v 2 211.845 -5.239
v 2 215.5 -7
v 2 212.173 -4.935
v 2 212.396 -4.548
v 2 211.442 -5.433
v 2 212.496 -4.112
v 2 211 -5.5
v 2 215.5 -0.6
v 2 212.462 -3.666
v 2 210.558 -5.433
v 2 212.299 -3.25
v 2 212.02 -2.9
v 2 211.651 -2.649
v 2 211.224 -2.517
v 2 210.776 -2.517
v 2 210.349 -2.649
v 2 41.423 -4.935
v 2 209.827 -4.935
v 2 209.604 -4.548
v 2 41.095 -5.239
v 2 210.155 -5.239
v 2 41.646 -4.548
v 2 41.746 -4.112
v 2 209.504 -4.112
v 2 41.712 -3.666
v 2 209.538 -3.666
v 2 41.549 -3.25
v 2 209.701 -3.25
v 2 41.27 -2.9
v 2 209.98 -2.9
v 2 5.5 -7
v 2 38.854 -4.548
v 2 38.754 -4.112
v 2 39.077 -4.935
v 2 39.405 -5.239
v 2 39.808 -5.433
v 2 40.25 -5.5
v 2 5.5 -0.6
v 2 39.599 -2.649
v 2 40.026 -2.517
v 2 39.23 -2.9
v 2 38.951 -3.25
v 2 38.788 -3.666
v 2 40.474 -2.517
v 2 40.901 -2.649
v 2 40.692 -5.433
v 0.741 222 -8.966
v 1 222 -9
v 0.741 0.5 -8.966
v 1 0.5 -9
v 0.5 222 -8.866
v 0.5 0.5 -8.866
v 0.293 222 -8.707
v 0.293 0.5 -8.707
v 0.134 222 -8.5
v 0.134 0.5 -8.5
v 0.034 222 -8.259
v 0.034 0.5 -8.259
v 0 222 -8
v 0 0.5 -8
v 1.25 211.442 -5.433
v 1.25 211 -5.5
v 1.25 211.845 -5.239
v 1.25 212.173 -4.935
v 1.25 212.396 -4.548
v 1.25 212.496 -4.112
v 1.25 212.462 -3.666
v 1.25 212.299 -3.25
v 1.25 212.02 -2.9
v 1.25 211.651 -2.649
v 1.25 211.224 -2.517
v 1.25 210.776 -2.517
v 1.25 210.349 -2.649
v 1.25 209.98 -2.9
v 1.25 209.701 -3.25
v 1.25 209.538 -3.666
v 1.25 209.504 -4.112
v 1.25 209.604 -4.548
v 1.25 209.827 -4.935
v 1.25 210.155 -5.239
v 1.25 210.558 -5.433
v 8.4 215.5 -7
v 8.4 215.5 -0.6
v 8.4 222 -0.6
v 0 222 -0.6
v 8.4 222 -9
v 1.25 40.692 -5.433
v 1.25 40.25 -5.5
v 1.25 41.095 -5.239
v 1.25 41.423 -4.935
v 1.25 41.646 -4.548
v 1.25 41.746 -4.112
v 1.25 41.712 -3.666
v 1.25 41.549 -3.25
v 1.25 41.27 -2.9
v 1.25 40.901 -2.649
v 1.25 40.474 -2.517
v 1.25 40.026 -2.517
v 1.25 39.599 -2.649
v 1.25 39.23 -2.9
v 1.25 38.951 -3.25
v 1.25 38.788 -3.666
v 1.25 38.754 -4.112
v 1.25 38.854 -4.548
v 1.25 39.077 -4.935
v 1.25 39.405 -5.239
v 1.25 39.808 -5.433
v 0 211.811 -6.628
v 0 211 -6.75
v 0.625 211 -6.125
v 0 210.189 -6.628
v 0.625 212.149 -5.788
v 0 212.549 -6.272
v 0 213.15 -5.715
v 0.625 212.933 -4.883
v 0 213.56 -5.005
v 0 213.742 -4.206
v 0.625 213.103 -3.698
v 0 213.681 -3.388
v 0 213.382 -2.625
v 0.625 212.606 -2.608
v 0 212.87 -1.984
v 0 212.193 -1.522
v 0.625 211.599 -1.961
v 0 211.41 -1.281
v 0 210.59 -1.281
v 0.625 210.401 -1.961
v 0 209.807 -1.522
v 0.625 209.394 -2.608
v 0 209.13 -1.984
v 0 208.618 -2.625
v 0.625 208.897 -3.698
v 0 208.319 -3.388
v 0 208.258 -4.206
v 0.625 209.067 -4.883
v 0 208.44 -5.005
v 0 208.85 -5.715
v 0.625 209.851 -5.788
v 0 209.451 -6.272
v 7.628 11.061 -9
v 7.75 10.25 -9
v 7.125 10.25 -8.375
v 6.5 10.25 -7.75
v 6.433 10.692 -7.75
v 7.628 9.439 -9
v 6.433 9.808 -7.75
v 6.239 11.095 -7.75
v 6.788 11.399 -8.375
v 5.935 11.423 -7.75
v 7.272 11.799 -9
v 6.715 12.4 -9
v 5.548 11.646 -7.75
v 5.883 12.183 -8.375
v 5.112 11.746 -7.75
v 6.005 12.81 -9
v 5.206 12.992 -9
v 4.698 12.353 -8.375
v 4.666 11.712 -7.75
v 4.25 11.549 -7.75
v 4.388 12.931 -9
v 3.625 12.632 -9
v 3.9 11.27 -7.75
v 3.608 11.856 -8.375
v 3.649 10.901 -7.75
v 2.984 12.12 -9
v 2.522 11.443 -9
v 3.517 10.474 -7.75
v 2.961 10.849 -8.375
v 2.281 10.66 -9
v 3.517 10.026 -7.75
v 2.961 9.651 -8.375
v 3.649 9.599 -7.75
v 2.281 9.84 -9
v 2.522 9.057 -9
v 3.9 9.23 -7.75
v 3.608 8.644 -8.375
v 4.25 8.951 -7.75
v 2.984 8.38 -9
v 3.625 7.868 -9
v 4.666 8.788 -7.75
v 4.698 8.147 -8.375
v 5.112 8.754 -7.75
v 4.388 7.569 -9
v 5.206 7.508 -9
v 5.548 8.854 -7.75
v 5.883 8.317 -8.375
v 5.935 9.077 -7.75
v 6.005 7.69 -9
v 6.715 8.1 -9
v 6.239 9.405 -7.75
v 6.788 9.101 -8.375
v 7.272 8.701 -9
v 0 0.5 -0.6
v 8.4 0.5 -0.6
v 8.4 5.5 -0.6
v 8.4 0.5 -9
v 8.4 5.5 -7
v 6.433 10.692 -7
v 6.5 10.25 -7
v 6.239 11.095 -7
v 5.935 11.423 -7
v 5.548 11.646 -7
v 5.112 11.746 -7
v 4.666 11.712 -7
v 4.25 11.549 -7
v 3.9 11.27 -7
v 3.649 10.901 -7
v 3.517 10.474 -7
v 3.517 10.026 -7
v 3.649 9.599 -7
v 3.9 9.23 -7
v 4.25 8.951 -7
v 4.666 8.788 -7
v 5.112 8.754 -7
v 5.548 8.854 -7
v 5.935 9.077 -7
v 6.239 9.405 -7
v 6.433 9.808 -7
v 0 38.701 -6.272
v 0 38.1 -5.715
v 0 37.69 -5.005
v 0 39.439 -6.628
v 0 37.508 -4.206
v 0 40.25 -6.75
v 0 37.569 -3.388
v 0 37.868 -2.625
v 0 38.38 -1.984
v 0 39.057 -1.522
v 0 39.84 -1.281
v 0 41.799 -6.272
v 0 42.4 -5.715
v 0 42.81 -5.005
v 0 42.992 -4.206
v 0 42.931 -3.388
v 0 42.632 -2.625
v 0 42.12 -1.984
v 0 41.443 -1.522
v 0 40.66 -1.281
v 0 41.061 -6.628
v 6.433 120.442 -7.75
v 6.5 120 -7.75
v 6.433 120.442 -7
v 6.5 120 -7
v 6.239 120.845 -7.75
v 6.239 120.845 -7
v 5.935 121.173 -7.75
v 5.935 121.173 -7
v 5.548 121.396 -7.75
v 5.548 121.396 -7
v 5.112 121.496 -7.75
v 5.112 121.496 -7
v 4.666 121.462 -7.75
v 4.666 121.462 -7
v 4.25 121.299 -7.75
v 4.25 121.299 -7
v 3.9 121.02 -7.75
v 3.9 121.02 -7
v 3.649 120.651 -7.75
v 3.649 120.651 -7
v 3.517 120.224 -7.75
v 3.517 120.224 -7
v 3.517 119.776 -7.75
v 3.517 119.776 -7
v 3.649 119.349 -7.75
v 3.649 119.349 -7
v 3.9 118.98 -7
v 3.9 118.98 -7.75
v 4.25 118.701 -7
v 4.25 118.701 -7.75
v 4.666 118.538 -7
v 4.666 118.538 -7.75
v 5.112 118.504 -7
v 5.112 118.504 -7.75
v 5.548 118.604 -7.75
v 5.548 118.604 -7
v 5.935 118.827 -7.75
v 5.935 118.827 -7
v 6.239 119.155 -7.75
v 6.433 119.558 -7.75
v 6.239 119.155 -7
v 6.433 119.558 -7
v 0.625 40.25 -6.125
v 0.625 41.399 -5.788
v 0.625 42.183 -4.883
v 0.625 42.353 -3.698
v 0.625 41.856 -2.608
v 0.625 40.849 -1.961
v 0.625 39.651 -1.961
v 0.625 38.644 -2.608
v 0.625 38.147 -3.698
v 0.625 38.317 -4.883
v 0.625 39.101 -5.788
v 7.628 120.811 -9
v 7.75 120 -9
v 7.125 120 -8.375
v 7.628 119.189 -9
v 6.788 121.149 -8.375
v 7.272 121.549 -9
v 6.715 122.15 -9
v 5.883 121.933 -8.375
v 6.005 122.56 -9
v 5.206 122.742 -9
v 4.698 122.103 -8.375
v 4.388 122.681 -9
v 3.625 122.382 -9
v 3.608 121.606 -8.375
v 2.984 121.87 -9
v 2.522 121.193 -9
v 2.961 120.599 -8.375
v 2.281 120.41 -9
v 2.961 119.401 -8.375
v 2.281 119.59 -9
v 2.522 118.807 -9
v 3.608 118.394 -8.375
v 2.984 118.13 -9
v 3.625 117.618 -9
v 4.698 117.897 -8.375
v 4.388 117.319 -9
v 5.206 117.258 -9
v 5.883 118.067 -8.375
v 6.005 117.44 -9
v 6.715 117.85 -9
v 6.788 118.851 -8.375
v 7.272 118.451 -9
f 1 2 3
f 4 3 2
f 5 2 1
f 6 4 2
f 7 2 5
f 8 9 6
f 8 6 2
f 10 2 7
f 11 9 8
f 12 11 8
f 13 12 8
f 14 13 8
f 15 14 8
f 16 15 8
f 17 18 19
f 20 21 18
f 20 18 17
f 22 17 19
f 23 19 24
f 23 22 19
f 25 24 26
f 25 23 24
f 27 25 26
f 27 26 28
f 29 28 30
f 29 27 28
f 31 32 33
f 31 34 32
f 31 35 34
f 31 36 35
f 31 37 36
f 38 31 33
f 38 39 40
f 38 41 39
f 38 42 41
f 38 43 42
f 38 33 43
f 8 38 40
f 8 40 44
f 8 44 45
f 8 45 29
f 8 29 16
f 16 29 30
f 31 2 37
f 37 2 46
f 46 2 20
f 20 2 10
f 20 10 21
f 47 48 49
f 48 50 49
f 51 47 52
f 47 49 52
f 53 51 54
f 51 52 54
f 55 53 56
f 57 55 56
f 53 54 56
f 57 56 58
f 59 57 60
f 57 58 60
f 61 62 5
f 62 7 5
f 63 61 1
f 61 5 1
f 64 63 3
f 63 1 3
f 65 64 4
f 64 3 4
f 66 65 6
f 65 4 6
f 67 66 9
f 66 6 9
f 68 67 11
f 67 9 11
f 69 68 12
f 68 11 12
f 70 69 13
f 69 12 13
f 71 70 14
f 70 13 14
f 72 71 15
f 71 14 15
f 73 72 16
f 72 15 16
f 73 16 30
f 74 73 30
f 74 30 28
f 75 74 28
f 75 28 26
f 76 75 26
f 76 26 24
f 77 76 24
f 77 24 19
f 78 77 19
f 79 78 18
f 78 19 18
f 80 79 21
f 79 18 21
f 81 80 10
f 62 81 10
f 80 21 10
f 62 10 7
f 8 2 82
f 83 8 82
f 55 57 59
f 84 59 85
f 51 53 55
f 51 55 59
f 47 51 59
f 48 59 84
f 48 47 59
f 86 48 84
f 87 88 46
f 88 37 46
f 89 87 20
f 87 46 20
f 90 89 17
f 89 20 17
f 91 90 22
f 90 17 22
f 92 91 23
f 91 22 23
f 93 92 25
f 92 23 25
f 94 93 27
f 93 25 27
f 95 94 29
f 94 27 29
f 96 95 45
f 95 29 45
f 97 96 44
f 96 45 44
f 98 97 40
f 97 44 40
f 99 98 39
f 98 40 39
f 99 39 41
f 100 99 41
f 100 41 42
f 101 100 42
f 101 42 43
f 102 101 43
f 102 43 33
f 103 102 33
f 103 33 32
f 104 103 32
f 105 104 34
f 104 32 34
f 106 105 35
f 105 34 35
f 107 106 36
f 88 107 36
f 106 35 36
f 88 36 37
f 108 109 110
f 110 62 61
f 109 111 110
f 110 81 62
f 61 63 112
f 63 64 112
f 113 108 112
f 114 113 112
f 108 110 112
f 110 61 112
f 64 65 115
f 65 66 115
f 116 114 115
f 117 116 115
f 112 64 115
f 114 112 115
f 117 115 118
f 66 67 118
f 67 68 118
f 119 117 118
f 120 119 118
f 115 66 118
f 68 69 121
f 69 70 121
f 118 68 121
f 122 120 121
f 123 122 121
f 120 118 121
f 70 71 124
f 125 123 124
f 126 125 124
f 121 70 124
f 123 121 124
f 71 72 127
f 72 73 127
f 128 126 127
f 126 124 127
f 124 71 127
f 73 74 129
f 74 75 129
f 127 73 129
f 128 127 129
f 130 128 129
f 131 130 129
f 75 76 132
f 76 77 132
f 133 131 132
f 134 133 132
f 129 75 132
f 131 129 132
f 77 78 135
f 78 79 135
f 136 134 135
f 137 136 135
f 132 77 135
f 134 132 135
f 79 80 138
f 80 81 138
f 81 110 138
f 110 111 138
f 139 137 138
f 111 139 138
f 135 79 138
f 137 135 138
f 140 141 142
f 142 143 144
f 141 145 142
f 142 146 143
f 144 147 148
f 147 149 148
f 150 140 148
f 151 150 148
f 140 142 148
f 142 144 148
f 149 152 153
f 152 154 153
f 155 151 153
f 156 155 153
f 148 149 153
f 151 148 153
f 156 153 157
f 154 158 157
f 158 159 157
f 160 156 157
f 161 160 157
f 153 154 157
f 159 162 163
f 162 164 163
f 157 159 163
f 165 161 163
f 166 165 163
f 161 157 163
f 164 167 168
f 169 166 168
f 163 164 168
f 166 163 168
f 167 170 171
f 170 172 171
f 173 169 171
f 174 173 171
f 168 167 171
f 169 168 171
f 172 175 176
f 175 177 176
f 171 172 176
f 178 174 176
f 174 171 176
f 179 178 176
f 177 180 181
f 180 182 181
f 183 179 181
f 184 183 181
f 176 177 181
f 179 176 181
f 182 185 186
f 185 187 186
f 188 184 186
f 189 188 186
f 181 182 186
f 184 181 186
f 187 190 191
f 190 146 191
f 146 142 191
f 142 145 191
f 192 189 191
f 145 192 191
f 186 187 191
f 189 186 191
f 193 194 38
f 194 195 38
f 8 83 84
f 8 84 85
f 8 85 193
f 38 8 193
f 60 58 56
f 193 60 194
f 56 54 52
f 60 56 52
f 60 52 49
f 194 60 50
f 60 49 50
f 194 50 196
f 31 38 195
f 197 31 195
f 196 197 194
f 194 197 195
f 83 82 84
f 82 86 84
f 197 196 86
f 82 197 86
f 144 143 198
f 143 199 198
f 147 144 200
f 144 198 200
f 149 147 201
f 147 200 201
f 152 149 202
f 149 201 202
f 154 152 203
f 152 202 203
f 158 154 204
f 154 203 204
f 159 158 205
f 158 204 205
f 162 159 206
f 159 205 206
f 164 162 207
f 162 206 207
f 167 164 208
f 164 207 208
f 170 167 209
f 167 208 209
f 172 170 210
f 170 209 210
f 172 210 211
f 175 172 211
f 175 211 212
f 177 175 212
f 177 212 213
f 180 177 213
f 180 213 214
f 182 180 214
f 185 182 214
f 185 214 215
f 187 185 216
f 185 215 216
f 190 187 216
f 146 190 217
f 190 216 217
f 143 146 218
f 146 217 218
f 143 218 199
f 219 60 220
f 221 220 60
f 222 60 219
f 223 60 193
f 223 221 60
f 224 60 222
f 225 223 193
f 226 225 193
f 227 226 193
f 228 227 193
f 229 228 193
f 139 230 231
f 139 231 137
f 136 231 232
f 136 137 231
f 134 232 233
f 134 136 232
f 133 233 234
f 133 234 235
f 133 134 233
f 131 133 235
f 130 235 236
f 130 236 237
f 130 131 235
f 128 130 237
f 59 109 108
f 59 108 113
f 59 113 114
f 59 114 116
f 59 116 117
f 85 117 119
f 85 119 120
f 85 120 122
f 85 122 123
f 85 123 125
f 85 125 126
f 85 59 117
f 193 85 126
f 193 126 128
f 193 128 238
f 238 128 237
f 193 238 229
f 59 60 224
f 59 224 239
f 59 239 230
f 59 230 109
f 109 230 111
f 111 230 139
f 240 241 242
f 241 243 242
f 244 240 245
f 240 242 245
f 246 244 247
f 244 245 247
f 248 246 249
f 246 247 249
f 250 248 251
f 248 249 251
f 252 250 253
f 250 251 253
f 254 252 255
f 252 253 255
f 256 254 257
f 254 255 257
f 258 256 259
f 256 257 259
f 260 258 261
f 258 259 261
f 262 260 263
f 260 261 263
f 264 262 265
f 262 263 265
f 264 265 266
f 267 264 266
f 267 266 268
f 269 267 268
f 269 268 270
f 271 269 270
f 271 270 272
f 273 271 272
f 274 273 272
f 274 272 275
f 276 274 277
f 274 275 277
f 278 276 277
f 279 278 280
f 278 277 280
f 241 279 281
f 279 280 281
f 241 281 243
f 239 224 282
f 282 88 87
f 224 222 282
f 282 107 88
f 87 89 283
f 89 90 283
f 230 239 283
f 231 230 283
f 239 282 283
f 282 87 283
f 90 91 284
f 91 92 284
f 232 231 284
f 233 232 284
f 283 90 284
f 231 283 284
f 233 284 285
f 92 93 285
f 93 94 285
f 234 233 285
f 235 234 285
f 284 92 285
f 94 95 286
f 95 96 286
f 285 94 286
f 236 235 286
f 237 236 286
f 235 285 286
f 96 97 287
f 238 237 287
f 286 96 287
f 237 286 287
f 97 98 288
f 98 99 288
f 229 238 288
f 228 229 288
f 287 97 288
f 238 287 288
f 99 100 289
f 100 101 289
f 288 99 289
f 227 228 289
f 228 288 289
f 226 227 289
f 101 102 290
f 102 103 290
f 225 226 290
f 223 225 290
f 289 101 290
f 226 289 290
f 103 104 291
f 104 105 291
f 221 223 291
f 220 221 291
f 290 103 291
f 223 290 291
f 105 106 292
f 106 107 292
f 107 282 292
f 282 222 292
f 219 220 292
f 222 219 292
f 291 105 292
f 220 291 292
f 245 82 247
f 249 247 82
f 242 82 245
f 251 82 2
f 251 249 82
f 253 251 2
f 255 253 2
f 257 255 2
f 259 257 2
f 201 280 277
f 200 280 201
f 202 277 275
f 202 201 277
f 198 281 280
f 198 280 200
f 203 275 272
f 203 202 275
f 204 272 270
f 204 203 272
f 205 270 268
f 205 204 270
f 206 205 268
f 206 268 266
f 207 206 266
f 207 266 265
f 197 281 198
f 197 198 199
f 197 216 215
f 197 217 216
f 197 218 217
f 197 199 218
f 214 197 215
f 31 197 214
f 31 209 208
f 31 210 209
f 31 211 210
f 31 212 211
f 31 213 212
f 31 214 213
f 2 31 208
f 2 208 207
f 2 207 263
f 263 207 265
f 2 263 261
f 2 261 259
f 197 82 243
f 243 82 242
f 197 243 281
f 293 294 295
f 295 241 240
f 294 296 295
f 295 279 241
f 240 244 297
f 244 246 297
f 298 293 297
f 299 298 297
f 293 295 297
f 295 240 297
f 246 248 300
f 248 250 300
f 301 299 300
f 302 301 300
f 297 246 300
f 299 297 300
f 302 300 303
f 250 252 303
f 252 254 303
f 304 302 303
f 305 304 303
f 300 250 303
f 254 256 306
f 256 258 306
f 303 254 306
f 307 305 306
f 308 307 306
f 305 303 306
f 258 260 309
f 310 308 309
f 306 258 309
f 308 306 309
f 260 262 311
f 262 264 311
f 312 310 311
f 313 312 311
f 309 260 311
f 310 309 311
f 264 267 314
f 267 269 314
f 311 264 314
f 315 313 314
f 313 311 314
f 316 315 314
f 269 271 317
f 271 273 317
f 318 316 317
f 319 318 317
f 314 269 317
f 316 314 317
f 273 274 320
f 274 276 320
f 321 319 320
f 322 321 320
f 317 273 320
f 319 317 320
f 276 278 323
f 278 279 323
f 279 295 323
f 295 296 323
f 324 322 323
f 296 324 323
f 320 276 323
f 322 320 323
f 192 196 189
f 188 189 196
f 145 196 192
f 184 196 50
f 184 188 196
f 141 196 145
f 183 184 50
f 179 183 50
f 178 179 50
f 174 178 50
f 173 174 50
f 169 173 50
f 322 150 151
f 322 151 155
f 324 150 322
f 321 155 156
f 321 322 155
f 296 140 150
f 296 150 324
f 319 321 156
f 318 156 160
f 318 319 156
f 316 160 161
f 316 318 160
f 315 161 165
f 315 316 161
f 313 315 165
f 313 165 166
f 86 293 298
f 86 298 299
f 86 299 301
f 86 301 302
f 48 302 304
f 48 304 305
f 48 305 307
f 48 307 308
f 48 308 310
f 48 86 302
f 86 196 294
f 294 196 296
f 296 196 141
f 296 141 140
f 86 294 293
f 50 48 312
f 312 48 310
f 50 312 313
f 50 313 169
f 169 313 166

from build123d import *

# Parameters (mm, degrees)
BOSS_EXTRUDE1_DEPTH                                 = 221.5
CSK_FOR_M3_COUNTERSUNK_FLAT_HEAD_SCREW1_D           = 3
CSK_FOR_M3_COUNTERSUNK_FLAT_HEAD_SCREW1_CSINK_D     = 5.5
CSK_FOR_M3_COUNTERSUNK_FLAT_HEAD_SCREW1_CSINK_ANGLE = 90
CSK_FOR_M3_COUNTERSUNK_FLAT_HEAD_SCREW4_D           = 3
CSK_FOR_M3_COUNTERSUNK_FLAT_HEAD_SCREW4_CSINK_D     = 5.5
CSK_FOR_M3_COUNTERSUNK_FLAT_HEAD_SCREW4_CSINK_ANGLE = 90
SKETCH12_W                                          = 8
SKETCH12_H                                          = 7
BOSS_EXTRUDE2_DEPTH                                 = 5.5
CUT_EXTRUDE1_DEPTH                                  = 359
BOSS_EXTRUDE3_DEPTH                                 = 3
BOSS_EXTRUDE4_DEPTH                                 = 2.5
BOSS_EXTRUDE4_DEPTH_BACK                            = 6
SKETCH19_W                                          = 0.6
SKETCH19_H                                          = 227
CUT_EXTRUDE2_DEPTH                                  = 10
SKETCH20_W                                          = 15.604741464
SKETCH20_H                                          = 2
CUT_EXTRUDE3_DEPTH                                  = 10
SKETCH21_W                                          = 0.6
SKETCH21_H                                          = 225
CUT_EXTRUDE4_DEPTH                                  = 10
SKETCH22_W                                          = 8.4
SKETCH22_H                                          = 5.5
CUT_EXTRUDE5_DEPTH                                  = 10
BOSS_EXTRUDE5_DEPTH                                 = 2
BOSS_EXTRUDE6_DEPTH                                 = 221.5
FILLET1_R                                           = 1


with BuildPart() as part:
    # Sketch1 → Boss-Extrude1 (new body)
    with BuildSketch(Plane(origin=(0, 0, 0), x_dir=(1, 0, 0), z_dir=(0, 1, 0))):
        Polygon((0, 0), (0, 9), (9, 9), (9, 7), (2, 7), (2, 0), align=None)
    extrude(amount=BOSS_EXTRUDE1_DEPTH)

    # CSK for M3 Countersunk Flat Head Screw1 (through all)
    with Locations(Plane.ZY):
        with Locations((-4, 211), (-4, 40.25)):
            CounterSinkHole(CSK_FOR_M3_COUNTERSUNK_FLAT_HEAD_SCREW1_D / 2, CSK_FOR_M3_COUNTERSUNK_FLAT_HEAD_SCREW1_CSINK_D / 2, counter_sink_angle=CSK_FOR_M3_COUNTERSUNK_FLAT_HEAD_SCREW1_CSINK_ANGLE)

    # CSK for M3 Countersunk Flat Head Screw4 (through all)
    with Locations(Plane(origin=(0, 0, -9), x_dir=(-1, 0, 0), z_dir=(0, 0, -1))):
        with Locations((-5, 10.25), (-5, 120)):
            CounterSinkHole(CSK_FOR_M3_COUNTERSUNK_FLAT_HEAD_SCREW4_D / 2, CSK_FOR_M3_COUNTERSUNK_FLAT_HEAD_SCREW4_CSINK_D / 2, counter_sink_angle=CSK_FOR_M3_COUNTERSUNK_FLAT_HEAD_SCREW4_CSINK_ANGLE)

    # Sketch12 → Boss-Extrude2 (add)
    with BuildSketch(Plane.XZ):
        with Locations((5, -3.5)):
            Rectangle(SKETCH12_W, SKETCH12_H)
    extrude(amount=-BOSS_EXTRUDE2_DEPTH)

    # Sketch13 → Cut-Extrude1 (cut)
    with BuildSketch(Plane(origin=(0, 221.5, 0), x_dir=(1, 0, 0), z_dir=(0, 1, 0))):
        Polygon((0, 8), (1, 9), (0, 9), align=None)
    extrude(amount=-CUT_EXTRUDE1_DEPTH, mode=Mode.SUBTRACT)

    # Sketch14 → Boss-Extrude3 (add)
    with BuildSketch(Plane.XZ):
        Polygon((0, 0), (9, 0), (9, -9), (1, -9), (0, -8), align=None)
    extrude(amount=BOSS_EXTRUDE3_DEPTH)

    # Sketch18 → Boss-Extrude4 (add, two sides: drawn at the far end of the back side and taken through both)
    with BuildSketch(Plane(origin=(0, 221.5, 0), x_dir=(1, 0, 0), z_dir=(0, 1, 0)).offset(-BOSS_EXTRUDE4_DEPTH_BACK)):
        Polygon((0, 0), (9, 0), (9, 9), (1, 9), (0, 8), align=None)
    extrude(amount=BOSS_EXTRUDE4_DEPTH + BOSS_EXTRUDE4_DEPTH_BACK)

    # Sketch19 → Cut-Extrude2 (cut)
    with BuildSketch(Plane.ZY):
        with Locations((-0.3, 110.5)):
            Rectangle(SKETCH19_W, SKETCH19_H)
    extrude(amount=-CUT_EXTRUDE2_DEPTH, mode=Mode.SUBTRACT)

    # Sketch20 → Cut-Extrude3 (cut)
    with BuildSketch(Plane.ZY):
        with Locations((-8.402370732, 223)):
            Rectangle(SKETCH20_W, SKETCH20_H)
    extrude(amount=-CUT_EXTRUDE3_DEPTH, mode=Mode.SUBTRACT)

    # Sketch21 → Cut-Extrude4 (cut)
    with BuildSketch(Plane(origin=(0, 0, -9), x_dir=(-1, 0, 0), z_dir=(0, 0, -1))):
        with Locations((-8.7, 109.5)):
            Rectangle(SKETCH21_W, SKETCH21_H)
    extrude(amount=-CUT_EXTRUDE4_DEPTH, mode=Mode.SUBTRACT)

    # Sketch22 → Cut-Extrude5 (cut)
    with BuildSketch(Plane(origin=(0, 0, -9), x_dir=(-1, 0, 0), z_dir=(0, 0, -1))):
        with Locations((-4.2, -0.25)):
            Rectangle(SKETCH22_W, SKETCH22_H)
    extrude(amount=-CUT_EXTRUDE5_DEPTH, mode=Mode.SUBTRACT)

    # Sketch26 → Boss-Extrude5 (add)
    with BuildSketch(Plane.XZ.offset(-2.5)):
        Polygon((8.4, -9), (8.4, -0.6), (0, -0.6), (0, -8), (1, -9), align=None)
    extrude(amount=BOSS_EXTRUDE5_DEPTH)

    # Sketch29 → Boss-Extrude6 (add)
    with BuildSketch(Plane(origin=(0, 222, 0), x_dir=(1, 0, 0), z_dir=(0, 1, 0))):
        Polygon((0, 8), (1, 9), (0, 9), align=None)
    extrude(amount=-BOSS_EXTRUDE6_DEPTH)

    # Fillet1
    fillet1_edges = [part.edges().sort_by_distance(p)[0] for p in [
        (0, 111.25, -9),
    ]]
    fillet(fillet1_edges, radius=FILLET1_R)


solid = part.part
